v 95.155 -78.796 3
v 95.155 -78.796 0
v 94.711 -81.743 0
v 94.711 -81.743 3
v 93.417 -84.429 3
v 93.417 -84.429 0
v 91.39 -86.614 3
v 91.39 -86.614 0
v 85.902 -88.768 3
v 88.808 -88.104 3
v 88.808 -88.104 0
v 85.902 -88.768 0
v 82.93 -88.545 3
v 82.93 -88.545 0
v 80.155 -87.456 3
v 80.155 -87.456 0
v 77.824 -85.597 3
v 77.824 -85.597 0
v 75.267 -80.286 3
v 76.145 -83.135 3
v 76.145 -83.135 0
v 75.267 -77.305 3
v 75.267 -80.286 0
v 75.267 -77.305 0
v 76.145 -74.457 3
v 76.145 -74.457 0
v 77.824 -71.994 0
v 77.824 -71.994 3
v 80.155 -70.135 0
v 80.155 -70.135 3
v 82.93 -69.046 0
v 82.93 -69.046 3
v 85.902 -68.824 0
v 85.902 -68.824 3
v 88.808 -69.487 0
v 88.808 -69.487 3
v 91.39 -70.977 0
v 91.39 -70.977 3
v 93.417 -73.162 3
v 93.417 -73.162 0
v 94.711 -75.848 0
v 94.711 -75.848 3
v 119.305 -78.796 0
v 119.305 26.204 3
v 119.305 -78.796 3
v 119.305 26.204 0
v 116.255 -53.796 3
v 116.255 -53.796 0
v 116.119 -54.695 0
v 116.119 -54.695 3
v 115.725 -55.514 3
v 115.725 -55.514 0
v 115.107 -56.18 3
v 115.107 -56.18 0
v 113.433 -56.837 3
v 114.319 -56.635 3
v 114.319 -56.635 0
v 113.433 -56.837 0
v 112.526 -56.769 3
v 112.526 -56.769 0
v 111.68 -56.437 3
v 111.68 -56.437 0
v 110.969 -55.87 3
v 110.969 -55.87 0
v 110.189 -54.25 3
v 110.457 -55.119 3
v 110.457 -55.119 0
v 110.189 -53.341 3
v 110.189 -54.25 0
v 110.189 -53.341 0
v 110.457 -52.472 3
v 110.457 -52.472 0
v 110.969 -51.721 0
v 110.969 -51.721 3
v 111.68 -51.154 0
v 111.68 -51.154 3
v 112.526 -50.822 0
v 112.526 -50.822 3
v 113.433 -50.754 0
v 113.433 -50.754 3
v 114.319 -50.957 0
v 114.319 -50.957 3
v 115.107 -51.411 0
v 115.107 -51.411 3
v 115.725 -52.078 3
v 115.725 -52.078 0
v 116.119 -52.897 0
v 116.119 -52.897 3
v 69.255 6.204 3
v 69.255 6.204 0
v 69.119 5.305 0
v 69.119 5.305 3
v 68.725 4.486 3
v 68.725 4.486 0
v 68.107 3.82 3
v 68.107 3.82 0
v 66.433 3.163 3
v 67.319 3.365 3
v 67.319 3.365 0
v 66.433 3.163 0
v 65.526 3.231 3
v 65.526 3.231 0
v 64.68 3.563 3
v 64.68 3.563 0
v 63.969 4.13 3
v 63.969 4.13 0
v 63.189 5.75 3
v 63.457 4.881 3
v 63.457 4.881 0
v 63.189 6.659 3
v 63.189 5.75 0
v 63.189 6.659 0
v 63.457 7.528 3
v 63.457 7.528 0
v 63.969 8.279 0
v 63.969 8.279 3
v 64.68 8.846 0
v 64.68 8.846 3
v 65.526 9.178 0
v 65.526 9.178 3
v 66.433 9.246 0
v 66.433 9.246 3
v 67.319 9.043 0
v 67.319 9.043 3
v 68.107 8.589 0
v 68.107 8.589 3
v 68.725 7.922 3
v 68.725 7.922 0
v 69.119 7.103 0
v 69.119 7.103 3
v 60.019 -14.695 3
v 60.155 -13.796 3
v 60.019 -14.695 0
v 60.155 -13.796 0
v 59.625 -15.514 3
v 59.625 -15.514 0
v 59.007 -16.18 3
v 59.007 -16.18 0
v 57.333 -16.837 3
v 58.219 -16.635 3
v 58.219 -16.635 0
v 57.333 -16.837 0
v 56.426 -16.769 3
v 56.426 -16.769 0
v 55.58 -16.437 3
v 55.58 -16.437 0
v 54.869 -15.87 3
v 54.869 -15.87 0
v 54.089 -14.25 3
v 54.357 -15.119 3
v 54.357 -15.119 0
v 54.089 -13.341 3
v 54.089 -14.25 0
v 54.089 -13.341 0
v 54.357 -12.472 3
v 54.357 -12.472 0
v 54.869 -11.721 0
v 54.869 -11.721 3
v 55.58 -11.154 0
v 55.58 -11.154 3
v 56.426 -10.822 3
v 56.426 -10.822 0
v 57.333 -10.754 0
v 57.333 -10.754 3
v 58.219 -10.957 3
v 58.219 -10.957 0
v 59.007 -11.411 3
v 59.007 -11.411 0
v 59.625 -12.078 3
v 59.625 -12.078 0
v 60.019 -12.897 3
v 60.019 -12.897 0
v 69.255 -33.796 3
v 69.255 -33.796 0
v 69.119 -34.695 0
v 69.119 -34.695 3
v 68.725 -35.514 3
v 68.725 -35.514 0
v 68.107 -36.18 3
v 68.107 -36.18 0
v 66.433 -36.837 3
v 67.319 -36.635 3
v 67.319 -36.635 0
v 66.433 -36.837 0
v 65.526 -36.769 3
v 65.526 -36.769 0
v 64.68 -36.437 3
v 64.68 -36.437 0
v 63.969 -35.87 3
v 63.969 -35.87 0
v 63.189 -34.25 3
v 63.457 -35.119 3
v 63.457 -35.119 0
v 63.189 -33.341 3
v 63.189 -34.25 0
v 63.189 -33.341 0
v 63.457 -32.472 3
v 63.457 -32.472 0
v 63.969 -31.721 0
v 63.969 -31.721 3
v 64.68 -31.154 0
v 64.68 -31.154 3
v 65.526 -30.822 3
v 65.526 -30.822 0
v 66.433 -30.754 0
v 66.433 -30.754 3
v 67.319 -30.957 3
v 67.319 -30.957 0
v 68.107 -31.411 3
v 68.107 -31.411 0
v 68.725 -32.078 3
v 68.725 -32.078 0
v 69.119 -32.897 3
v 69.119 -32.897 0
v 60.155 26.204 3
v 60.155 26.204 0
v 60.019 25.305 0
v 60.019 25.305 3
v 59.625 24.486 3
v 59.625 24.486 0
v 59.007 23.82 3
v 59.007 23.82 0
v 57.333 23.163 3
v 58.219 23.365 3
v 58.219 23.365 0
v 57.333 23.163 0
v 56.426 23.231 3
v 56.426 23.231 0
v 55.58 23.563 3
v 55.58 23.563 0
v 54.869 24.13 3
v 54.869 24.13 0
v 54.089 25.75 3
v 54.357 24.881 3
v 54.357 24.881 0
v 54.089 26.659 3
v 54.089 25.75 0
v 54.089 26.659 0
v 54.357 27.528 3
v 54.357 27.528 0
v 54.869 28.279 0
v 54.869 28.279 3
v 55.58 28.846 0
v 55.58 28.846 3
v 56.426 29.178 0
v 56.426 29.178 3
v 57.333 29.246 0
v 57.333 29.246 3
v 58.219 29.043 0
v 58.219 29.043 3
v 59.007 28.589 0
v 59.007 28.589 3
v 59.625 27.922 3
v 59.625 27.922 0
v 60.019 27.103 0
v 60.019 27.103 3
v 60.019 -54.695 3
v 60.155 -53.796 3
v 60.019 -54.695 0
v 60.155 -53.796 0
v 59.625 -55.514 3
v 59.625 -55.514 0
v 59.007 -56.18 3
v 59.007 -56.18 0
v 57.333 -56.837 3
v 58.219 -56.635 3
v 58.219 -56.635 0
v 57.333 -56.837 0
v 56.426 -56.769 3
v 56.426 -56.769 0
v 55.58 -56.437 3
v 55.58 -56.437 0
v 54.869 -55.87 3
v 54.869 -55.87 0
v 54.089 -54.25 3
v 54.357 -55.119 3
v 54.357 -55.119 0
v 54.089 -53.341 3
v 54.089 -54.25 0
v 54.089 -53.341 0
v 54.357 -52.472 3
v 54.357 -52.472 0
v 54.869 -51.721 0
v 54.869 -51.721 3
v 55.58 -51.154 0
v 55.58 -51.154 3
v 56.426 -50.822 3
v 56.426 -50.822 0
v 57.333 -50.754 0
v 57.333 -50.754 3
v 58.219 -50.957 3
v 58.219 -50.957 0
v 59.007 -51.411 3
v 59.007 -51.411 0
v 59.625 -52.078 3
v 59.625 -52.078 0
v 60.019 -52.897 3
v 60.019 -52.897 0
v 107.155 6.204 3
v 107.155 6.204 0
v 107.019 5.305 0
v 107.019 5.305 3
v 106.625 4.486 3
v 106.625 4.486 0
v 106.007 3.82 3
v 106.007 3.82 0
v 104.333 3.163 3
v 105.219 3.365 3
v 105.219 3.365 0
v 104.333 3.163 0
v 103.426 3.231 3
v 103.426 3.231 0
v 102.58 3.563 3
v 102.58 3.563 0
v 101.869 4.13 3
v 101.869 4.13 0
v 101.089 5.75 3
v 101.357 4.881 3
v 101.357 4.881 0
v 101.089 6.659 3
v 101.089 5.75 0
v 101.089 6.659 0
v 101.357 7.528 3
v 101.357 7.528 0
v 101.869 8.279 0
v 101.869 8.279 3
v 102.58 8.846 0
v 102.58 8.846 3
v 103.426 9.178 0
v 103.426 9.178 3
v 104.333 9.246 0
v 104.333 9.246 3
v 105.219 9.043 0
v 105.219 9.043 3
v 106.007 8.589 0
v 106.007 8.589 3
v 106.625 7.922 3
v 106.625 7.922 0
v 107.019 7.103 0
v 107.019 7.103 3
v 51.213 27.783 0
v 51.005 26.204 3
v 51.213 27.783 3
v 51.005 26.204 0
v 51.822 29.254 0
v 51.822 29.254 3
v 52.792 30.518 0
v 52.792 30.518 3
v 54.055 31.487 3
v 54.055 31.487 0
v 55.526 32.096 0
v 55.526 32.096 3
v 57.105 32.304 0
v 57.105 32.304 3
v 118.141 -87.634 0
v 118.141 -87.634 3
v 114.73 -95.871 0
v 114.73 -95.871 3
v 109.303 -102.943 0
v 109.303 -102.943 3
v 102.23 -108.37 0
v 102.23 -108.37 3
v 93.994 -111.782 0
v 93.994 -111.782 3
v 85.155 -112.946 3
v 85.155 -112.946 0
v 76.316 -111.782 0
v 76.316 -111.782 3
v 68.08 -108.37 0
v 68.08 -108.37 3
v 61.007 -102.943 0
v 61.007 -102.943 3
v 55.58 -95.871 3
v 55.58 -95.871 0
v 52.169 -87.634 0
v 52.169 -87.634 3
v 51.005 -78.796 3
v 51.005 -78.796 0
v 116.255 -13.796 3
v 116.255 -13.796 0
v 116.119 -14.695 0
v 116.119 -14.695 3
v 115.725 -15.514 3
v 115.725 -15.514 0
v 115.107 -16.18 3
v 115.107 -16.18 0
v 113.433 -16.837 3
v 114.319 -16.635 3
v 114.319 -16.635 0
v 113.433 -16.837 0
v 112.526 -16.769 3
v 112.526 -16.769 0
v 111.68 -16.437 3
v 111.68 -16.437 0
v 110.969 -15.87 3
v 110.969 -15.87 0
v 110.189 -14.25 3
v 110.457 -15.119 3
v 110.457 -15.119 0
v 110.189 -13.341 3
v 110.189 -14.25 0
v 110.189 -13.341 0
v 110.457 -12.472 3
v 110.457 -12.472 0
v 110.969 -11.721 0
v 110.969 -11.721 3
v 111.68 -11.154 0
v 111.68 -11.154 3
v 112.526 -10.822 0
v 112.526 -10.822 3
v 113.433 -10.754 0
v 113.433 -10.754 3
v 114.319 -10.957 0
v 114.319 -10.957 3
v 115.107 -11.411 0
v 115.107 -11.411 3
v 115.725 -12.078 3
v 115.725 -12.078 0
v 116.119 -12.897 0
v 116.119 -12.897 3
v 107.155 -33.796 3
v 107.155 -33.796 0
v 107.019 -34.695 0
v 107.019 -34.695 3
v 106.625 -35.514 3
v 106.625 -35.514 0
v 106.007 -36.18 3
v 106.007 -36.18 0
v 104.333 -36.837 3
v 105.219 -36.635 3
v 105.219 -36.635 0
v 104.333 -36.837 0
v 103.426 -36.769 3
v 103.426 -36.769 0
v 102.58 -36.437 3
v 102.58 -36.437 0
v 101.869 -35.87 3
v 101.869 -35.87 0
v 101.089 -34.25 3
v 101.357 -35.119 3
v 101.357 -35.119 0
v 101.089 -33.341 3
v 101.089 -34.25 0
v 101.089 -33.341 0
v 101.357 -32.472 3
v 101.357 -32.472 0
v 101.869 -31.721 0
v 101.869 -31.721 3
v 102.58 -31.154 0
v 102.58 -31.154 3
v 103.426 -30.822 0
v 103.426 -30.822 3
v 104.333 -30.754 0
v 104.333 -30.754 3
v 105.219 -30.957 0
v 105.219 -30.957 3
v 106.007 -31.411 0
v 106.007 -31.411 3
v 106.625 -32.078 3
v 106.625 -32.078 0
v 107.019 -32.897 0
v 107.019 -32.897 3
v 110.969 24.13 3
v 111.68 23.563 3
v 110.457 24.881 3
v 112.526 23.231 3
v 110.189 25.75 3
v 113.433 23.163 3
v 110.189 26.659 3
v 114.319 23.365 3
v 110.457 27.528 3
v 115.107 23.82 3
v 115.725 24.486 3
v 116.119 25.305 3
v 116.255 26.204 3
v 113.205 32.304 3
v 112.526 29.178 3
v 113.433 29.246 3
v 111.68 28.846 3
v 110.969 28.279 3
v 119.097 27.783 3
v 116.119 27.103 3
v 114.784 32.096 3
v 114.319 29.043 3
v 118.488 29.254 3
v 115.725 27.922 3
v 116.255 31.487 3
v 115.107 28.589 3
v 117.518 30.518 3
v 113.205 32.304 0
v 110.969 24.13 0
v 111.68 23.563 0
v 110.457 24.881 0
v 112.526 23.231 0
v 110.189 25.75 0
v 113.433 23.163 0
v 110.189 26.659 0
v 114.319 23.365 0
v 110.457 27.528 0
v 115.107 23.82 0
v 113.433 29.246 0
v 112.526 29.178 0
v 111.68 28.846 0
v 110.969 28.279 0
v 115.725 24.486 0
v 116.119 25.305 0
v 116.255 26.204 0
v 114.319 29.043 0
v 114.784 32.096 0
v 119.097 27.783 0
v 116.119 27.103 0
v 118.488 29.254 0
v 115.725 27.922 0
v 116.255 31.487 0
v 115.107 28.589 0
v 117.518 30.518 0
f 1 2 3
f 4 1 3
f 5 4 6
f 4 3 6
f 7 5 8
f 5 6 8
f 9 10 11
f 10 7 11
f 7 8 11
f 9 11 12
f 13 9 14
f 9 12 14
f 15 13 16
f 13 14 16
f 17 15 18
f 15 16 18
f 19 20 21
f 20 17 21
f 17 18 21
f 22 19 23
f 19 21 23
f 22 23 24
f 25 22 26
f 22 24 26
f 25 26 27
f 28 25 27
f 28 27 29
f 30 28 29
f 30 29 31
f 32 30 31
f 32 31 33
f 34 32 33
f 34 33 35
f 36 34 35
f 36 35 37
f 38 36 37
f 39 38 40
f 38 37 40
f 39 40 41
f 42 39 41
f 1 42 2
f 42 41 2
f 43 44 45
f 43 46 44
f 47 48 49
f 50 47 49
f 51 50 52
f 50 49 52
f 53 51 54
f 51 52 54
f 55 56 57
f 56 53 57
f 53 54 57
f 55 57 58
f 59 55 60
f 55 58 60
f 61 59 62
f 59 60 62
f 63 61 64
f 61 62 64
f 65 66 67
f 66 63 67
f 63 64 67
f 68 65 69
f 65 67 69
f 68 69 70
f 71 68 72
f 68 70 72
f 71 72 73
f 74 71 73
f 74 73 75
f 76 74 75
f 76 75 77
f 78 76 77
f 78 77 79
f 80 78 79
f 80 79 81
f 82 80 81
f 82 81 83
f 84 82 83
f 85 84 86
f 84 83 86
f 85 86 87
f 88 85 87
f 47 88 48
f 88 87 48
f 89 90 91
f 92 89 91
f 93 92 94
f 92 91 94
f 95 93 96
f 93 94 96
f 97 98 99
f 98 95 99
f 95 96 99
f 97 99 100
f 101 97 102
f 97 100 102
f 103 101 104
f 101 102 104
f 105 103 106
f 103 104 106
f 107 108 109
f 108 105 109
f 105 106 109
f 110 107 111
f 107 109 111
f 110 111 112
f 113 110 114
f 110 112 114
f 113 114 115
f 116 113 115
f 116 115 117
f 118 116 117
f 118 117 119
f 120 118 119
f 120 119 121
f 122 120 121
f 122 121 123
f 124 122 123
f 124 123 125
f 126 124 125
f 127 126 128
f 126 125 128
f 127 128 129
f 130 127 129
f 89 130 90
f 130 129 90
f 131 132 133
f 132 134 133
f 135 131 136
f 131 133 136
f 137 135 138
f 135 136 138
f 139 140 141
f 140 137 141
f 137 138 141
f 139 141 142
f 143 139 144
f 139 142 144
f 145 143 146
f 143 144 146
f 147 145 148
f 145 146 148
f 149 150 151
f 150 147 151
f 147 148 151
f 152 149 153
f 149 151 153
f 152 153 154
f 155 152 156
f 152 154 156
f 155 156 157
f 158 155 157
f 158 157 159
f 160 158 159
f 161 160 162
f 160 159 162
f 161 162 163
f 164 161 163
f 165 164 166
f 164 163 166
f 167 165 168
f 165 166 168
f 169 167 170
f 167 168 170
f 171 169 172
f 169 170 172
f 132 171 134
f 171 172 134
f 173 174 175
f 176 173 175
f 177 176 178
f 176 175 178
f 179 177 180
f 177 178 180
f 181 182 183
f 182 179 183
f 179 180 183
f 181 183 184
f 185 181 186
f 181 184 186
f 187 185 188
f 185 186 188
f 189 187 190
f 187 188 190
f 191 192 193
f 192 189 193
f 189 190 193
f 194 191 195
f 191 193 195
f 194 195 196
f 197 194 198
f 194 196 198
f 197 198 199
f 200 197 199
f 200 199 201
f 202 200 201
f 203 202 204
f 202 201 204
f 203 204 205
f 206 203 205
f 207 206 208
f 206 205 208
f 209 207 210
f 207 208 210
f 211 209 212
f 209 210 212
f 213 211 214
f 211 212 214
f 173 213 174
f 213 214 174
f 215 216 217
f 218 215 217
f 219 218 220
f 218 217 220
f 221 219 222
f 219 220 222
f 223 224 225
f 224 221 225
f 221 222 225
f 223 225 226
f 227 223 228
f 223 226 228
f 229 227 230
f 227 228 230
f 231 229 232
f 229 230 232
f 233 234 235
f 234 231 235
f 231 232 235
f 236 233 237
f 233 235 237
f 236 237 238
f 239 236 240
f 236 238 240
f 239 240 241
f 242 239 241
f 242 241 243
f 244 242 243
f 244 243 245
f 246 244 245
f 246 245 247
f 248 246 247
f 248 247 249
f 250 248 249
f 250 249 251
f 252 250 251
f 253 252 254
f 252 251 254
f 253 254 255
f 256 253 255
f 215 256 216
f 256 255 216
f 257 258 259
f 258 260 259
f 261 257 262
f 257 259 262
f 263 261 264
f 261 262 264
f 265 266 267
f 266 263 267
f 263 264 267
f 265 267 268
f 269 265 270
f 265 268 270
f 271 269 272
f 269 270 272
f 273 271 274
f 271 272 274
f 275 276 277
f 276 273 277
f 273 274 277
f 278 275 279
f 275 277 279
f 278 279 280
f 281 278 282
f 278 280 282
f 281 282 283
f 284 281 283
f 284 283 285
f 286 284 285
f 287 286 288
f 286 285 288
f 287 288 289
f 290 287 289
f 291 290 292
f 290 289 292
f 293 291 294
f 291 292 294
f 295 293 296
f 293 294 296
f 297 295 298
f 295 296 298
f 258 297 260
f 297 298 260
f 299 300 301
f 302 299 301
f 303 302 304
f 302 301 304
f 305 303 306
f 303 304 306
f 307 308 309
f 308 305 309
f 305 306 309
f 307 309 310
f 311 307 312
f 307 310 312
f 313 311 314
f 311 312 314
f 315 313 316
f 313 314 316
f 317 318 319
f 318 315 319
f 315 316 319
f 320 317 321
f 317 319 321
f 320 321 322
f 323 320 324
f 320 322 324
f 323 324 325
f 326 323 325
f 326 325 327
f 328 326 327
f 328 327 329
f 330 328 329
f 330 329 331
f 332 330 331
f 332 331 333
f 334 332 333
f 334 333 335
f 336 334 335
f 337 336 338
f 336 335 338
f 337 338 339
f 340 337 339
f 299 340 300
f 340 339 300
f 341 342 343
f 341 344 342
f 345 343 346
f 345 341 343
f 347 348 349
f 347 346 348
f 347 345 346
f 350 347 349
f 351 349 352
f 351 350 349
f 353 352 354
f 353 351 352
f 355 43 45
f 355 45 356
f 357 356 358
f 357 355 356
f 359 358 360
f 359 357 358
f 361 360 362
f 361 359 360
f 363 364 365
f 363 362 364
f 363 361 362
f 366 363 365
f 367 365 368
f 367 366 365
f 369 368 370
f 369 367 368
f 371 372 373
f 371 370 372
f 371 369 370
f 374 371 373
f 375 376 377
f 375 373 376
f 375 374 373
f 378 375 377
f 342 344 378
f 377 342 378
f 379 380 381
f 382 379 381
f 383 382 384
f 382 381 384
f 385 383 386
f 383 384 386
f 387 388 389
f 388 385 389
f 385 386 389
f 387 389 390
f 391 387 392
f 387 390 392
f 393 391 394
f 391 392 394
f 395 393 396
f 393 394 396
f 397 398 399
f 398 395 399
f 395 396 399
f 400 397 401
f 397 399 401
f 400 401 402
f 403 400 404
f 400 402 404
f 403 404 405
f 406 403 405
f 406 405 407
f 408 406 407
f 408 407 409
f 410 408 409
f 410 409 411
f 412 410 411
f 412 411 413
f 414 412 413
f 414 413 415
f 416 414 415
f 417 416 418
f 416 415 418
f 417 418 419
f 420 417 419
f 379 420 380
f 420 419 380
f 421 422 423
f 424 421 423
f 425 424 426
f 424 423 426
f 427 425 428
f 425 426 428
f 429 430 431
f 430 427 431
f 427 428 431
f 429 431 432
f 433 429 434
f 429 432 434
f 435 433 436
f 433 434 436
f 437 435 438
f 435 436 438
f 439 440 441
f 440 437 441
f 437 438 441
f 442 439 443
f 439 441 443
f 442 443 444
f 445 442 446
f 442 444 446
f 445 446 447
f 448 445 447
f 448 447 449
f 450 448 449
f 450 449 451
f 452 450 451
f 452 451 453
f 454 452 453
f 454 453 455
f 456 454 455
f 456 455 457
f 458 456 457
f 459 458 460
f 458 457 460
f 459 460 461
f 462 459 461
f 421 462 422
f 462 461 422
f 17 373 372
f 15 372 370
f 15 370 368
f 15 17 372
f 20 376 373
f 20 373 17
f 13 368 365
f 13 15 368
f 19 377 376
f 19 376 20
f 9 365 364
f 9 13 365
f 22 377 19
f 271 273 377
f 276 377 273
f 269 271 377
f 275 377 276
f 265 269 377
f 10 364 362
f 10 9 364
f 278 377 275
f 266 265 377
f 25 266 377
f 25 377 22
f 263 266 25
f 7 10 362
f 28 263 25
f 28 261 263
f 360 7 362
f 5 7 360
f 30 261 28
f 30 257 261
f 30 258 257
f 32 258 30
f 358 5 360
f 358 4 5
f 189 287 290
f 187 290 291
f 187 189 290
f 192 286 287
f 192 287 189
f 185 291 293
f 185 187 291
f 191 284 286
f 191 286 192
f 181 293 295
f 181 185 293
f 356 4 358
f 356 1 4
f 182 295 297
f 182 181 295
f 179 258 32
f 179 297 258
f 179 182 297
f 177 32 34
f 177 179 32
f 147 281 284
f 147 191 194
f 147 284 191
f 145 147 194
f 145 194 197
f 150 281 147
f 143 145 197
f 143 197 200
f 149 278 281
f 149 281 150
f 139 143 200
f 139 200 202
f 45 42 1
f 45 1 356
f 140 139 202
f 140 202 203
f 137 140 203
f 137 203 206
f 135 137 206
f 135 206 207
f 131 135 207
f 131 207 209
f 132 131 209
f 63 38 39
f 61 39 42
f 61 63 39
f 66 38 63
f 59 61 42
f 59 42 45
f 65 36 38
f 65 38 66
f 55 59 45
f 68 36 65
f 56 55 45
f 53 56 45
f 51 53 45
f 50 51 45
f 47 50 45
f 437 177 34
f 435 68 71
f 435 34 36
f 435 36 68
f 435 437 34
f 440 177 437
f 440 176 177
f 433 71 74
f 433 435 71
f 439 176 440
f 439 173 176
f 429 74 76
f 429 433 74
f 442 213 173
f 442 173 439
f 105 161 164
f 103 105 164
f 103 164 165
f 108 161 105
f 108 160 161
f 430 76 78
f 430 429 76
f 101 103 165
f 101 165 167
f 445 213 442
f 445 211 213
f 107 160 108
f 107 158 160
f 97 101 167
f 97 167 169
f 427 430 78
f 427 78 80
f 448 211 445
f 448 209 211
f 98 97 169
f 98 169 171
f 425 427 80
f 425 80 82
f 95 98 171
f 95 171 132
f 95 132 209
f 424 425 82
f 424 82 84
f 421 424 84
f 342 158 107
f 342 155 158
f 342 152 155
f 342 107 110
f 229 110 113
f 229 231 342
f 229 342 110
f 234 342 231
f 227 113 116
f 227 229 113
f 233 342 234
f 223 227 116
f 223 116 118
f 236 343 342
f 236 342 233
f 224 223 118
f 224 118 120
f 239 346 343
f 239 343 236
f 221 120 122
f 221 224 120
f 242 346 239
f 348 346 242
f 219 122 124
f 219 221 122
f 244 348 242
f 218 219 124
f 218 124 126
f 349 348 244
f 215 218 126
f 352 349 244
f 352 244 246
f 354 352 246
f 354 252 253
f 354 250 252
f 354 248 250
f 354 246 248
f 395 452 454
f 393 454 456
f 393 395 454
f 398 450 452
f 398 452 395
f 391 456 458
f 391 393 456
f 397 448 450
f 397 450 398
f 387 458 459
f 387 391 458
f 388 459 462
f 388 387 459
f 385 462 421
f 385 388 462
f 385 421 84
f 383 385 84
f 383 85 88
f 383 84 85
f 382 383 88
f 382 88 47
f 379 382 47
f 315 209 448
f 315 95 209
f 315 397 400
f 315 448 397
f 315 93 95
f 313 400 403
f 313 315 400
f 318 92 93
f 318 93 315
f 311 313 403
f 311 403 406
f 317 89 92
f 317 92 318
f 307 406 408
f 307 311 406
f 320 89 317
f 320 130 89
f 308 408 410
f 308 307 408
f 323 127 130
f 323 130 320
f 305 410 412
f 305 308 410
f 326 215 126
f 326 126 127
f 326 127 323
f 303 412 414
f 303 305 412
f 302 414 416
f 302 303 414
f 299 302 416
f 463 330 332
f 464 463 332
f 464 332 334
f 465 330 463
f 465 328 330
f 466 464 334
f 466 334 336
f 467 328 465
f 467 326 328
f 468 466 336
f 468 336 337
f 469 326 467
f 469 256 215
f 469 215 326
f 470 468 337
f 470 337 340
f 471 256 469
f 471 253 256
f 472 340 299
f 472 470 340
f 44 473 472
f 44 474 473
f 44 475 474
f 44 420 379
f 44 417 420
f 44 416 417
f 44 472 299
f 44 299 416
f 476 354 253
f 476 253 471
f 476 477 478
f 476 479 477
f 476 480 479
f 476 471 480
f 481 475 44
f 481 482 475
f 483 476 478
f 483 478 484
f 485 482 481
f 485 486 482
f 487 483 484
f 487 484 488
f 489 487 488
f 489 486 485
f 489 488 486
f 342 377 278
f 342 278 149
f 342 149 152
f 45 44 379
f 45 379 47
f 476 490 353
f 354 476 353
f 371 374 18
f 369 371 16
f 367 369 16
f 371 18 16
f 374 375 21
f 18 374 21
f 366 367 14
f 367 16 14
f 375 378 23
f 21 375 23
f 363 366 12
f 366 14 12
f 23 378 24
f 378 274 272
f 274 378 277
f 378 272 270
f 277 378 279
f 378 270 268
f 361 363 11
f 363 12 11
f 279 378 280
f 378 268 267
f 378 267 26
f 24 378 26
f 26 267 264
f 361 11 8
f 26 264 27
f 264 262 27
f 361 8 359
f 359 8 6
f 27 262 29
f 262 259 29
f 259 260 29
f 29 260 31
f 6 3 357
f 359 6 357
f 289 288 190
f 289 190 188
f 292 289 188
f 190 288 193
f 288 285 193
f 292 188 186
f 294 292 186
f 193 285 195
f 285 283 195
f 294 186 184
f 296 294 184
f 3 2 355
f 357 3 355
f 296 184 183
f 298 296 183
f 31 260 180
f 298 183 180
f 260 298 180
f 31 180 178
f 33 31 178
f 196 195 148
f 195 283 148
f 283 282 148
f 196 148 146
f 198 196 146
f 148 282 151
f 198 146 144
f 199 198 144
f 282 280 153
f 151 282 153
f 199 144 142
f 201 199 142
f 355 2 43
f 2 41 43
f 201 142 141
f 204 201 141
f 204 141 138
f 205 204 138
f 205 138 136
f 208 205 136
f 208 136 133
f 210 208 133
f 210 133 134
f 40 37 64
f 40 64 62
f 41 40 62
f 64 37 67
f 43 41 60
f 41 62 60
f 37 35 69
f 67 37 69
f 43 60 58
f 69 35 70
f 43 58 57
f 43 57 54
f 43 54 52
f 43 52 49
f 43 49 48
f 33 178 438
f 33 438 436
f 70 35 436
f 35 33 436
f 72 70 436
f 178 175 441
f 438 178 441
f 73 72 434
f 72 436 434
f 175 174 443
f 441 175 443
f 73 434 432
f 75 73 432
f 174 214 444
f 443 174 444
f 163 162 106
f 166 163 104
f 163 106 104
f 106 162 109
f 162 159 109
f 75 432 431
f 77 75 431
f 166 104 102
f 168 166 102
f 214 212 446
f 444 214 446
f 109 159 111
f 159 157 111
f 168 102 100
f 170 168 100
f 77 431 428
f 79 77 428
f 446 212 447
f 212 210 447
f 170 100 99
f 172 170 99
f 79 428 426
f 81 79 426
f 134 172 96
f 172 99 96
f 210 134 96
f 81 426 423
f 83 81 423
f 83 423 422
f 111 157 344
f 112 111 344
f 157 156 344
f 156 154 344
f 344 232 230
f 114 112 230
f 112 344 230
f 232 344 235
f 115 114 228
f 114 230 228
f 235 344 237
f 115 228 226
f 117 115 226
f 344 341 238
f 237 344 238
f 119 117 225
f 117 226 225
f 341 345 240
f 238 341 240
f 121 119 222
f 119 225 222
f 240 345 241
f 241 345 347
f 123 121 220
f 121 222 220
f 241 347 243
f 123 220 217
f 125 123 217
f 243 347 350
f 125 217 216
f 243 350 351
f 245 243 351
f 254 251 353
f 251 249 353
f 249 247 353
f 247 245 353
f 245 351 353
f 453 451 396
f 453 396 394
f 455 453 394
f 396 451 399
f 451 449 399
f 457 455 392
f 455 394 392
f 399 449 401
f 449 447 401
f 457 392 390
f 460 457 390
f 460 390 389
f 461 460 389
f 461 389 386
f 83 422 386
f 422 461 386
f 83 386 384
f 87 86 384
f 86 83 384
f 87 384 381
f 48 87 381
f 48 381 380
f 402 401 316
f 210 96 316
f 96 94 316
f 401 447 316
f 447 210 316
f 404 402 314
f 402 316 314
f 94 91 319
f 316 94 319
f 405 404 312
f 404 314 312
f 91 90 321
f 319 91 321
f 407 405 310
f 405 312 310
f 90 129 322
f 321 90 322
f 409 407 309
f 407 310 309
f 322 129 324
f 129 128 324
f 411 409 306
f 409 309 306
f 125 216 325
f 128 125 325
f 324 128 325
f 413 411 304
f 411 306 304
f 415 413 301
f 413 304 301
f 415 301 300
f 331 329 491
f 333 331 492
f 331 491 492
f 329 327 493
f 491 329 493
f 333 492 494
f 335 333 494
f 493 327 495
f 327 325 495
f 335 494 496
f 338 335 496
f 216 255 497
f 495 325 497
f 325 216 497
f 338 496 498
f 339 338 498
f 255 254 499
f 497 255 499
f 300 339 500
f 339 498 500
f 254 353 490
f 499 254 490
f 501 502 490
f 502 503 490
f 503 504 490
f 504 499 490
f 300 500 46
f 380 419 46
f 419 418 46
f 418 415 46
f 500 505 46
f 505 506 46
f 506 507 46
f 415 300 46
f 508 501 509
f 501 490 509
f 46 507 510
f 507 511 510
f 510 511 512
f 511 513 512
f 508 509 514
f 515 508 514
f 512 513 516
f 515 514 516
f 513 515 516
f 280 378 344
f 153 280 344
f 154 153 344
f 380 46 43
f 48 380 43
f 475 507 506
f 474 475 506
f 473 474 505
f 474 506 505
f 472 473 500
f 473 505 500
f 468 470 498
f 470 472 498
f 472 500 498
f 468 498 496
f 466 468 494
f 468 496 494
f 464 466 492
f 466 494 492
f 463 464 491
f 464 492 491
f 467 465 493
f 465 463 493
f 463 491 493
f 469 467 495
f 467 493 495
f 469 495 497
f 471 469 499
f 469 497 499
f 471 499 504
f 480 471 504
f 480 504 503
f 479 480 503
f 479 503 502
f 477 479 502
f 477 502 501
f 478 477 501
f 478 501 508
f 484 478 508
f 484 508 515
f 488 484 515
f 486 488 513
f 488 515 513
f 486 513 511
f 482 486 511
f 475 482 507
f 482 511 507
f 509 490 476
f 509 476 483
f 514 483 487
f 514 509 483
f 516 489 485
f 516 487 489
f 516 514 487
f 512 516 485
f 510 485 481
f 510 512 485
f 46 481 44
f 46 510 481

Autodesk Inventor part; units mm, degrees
ref_plane "YZ Plane" through (0, 0, 0) normal (1, 0, 0) x (0, 1, 0)
ref_plane "XZ Plane" through (0, 0, 0) normal (0, 1, 0) x (-1, 0, 0)
ref_plane "XY Plane" through (0, 0, 0) normal (0, 0, 1) x (1, 0, 0)
sketch "Эскиз3" plane through (0, 0, 0) normal (0, 0, 1) x (1, 0, 0)
  line L0 (110.155, -68.7957) -> (60.155, -68.7957) construction
  line L1 (60.155, -68.7957) -> (60.155, 68.0464) construction
  line L2 (110.155, 68.0464) -> (110.155, -68.7957) construction
  circle A0 centre (57.105, -53.7957) radius 3.05
  circle A1 centre (57.105, -13.7957) radius 3.05
  circle A2 centre (57.105, 26.2043) radius 3.05
  circle A3 centre (113.205, -53.7957) radius 3.05
  circle A4 centre (113.205, -13.7957) radius 3.05
  circle A5 centre (113.205, 26.2043) radius 3.05
  circle A6 centre (85.155, -78.7957) radius 10
  line L3 (85.155, -21.4404) -> (85.155, -113.936) construction
  arc A7 (119.305, 26.2043) -> (113.205, 32.3043) centre (113.205, 26.2043) ccw
  arc A8 (57.105, 32.3043) -> (51.005, 26.2043) centre (57.105, 26.2043) ccw
  line L4 (113.205, 32.3043) -> (57.105, 32.3043)
  line L5 (119.305, 26.2043) -> (119.305, -78.7957)
  line L6 (51.005, 26.2043) -> (51.005, -78.7957)
  arc A9 (51.005, -78.7957) -> (119.305, -78.7957) centre (85.155, -78.7957) ccw
  circle A10 centre (66.205, -33.7957) radius 3.05
  circle A11 centre (66.205, 6.2043) radius 3.05
  circle A12 centre (104.105, -33.7957) radius 3.05
  circle A13 centre (104.105, 6.2043) radius 3.05
  point P0 (0, 0)
  dimension "d8" = 50
  dimension "d11" = 40
  dimension "d14" = 56.1
  dimension "d17" = 6.1
  dimension "d18" = 15
  dimension "d19" = 20
  dimension "d20" = 12.2
  dimension "d21" = 12.2
  dimension "d24" = 40
  dimension "d27" = 37.9
  dimension "d30" = 20
extrude "Выдавливание3" add sketch "Эскиз3" along normal blind 3
equation "\"d8\" = hight_profile_femur"
equation "\"d14\" = hight_profile_femur + d_main_screw_holes"
equation "\"d17\" = d_main_screw_holes"
equation "\"d19\" = d_main_shaft"
equation "\"d20\" = 2 * d_main_screw_holes"
equation "\"d21\" = 2 * d_main_screw_holes"
equation "\"d27\" = -d_main_screw_holes + hight_profile_femur - 2 * thickness_profile_femur"
equation "\"d6\" = thickness_steel"
equation "\"tolerance_plazma\" = 0.1"
equation "\"thickness_steel\" = 3"
equation "\"d_main_screw_holes\" = 6.1"
equation "\"d_main_shaft\" = 20"
equation "\"thickness_profile_tibea\" = 4"
equation "\"thickness_profile_femur\" = 3"
equation "\"width_shaft_shift\" = 35"
equation "\"hight_profile_femur\" = 50"
equation "\"width_flattened_surface\" = 12"
properties part number "femur_outside_steel" material "Сталь"
